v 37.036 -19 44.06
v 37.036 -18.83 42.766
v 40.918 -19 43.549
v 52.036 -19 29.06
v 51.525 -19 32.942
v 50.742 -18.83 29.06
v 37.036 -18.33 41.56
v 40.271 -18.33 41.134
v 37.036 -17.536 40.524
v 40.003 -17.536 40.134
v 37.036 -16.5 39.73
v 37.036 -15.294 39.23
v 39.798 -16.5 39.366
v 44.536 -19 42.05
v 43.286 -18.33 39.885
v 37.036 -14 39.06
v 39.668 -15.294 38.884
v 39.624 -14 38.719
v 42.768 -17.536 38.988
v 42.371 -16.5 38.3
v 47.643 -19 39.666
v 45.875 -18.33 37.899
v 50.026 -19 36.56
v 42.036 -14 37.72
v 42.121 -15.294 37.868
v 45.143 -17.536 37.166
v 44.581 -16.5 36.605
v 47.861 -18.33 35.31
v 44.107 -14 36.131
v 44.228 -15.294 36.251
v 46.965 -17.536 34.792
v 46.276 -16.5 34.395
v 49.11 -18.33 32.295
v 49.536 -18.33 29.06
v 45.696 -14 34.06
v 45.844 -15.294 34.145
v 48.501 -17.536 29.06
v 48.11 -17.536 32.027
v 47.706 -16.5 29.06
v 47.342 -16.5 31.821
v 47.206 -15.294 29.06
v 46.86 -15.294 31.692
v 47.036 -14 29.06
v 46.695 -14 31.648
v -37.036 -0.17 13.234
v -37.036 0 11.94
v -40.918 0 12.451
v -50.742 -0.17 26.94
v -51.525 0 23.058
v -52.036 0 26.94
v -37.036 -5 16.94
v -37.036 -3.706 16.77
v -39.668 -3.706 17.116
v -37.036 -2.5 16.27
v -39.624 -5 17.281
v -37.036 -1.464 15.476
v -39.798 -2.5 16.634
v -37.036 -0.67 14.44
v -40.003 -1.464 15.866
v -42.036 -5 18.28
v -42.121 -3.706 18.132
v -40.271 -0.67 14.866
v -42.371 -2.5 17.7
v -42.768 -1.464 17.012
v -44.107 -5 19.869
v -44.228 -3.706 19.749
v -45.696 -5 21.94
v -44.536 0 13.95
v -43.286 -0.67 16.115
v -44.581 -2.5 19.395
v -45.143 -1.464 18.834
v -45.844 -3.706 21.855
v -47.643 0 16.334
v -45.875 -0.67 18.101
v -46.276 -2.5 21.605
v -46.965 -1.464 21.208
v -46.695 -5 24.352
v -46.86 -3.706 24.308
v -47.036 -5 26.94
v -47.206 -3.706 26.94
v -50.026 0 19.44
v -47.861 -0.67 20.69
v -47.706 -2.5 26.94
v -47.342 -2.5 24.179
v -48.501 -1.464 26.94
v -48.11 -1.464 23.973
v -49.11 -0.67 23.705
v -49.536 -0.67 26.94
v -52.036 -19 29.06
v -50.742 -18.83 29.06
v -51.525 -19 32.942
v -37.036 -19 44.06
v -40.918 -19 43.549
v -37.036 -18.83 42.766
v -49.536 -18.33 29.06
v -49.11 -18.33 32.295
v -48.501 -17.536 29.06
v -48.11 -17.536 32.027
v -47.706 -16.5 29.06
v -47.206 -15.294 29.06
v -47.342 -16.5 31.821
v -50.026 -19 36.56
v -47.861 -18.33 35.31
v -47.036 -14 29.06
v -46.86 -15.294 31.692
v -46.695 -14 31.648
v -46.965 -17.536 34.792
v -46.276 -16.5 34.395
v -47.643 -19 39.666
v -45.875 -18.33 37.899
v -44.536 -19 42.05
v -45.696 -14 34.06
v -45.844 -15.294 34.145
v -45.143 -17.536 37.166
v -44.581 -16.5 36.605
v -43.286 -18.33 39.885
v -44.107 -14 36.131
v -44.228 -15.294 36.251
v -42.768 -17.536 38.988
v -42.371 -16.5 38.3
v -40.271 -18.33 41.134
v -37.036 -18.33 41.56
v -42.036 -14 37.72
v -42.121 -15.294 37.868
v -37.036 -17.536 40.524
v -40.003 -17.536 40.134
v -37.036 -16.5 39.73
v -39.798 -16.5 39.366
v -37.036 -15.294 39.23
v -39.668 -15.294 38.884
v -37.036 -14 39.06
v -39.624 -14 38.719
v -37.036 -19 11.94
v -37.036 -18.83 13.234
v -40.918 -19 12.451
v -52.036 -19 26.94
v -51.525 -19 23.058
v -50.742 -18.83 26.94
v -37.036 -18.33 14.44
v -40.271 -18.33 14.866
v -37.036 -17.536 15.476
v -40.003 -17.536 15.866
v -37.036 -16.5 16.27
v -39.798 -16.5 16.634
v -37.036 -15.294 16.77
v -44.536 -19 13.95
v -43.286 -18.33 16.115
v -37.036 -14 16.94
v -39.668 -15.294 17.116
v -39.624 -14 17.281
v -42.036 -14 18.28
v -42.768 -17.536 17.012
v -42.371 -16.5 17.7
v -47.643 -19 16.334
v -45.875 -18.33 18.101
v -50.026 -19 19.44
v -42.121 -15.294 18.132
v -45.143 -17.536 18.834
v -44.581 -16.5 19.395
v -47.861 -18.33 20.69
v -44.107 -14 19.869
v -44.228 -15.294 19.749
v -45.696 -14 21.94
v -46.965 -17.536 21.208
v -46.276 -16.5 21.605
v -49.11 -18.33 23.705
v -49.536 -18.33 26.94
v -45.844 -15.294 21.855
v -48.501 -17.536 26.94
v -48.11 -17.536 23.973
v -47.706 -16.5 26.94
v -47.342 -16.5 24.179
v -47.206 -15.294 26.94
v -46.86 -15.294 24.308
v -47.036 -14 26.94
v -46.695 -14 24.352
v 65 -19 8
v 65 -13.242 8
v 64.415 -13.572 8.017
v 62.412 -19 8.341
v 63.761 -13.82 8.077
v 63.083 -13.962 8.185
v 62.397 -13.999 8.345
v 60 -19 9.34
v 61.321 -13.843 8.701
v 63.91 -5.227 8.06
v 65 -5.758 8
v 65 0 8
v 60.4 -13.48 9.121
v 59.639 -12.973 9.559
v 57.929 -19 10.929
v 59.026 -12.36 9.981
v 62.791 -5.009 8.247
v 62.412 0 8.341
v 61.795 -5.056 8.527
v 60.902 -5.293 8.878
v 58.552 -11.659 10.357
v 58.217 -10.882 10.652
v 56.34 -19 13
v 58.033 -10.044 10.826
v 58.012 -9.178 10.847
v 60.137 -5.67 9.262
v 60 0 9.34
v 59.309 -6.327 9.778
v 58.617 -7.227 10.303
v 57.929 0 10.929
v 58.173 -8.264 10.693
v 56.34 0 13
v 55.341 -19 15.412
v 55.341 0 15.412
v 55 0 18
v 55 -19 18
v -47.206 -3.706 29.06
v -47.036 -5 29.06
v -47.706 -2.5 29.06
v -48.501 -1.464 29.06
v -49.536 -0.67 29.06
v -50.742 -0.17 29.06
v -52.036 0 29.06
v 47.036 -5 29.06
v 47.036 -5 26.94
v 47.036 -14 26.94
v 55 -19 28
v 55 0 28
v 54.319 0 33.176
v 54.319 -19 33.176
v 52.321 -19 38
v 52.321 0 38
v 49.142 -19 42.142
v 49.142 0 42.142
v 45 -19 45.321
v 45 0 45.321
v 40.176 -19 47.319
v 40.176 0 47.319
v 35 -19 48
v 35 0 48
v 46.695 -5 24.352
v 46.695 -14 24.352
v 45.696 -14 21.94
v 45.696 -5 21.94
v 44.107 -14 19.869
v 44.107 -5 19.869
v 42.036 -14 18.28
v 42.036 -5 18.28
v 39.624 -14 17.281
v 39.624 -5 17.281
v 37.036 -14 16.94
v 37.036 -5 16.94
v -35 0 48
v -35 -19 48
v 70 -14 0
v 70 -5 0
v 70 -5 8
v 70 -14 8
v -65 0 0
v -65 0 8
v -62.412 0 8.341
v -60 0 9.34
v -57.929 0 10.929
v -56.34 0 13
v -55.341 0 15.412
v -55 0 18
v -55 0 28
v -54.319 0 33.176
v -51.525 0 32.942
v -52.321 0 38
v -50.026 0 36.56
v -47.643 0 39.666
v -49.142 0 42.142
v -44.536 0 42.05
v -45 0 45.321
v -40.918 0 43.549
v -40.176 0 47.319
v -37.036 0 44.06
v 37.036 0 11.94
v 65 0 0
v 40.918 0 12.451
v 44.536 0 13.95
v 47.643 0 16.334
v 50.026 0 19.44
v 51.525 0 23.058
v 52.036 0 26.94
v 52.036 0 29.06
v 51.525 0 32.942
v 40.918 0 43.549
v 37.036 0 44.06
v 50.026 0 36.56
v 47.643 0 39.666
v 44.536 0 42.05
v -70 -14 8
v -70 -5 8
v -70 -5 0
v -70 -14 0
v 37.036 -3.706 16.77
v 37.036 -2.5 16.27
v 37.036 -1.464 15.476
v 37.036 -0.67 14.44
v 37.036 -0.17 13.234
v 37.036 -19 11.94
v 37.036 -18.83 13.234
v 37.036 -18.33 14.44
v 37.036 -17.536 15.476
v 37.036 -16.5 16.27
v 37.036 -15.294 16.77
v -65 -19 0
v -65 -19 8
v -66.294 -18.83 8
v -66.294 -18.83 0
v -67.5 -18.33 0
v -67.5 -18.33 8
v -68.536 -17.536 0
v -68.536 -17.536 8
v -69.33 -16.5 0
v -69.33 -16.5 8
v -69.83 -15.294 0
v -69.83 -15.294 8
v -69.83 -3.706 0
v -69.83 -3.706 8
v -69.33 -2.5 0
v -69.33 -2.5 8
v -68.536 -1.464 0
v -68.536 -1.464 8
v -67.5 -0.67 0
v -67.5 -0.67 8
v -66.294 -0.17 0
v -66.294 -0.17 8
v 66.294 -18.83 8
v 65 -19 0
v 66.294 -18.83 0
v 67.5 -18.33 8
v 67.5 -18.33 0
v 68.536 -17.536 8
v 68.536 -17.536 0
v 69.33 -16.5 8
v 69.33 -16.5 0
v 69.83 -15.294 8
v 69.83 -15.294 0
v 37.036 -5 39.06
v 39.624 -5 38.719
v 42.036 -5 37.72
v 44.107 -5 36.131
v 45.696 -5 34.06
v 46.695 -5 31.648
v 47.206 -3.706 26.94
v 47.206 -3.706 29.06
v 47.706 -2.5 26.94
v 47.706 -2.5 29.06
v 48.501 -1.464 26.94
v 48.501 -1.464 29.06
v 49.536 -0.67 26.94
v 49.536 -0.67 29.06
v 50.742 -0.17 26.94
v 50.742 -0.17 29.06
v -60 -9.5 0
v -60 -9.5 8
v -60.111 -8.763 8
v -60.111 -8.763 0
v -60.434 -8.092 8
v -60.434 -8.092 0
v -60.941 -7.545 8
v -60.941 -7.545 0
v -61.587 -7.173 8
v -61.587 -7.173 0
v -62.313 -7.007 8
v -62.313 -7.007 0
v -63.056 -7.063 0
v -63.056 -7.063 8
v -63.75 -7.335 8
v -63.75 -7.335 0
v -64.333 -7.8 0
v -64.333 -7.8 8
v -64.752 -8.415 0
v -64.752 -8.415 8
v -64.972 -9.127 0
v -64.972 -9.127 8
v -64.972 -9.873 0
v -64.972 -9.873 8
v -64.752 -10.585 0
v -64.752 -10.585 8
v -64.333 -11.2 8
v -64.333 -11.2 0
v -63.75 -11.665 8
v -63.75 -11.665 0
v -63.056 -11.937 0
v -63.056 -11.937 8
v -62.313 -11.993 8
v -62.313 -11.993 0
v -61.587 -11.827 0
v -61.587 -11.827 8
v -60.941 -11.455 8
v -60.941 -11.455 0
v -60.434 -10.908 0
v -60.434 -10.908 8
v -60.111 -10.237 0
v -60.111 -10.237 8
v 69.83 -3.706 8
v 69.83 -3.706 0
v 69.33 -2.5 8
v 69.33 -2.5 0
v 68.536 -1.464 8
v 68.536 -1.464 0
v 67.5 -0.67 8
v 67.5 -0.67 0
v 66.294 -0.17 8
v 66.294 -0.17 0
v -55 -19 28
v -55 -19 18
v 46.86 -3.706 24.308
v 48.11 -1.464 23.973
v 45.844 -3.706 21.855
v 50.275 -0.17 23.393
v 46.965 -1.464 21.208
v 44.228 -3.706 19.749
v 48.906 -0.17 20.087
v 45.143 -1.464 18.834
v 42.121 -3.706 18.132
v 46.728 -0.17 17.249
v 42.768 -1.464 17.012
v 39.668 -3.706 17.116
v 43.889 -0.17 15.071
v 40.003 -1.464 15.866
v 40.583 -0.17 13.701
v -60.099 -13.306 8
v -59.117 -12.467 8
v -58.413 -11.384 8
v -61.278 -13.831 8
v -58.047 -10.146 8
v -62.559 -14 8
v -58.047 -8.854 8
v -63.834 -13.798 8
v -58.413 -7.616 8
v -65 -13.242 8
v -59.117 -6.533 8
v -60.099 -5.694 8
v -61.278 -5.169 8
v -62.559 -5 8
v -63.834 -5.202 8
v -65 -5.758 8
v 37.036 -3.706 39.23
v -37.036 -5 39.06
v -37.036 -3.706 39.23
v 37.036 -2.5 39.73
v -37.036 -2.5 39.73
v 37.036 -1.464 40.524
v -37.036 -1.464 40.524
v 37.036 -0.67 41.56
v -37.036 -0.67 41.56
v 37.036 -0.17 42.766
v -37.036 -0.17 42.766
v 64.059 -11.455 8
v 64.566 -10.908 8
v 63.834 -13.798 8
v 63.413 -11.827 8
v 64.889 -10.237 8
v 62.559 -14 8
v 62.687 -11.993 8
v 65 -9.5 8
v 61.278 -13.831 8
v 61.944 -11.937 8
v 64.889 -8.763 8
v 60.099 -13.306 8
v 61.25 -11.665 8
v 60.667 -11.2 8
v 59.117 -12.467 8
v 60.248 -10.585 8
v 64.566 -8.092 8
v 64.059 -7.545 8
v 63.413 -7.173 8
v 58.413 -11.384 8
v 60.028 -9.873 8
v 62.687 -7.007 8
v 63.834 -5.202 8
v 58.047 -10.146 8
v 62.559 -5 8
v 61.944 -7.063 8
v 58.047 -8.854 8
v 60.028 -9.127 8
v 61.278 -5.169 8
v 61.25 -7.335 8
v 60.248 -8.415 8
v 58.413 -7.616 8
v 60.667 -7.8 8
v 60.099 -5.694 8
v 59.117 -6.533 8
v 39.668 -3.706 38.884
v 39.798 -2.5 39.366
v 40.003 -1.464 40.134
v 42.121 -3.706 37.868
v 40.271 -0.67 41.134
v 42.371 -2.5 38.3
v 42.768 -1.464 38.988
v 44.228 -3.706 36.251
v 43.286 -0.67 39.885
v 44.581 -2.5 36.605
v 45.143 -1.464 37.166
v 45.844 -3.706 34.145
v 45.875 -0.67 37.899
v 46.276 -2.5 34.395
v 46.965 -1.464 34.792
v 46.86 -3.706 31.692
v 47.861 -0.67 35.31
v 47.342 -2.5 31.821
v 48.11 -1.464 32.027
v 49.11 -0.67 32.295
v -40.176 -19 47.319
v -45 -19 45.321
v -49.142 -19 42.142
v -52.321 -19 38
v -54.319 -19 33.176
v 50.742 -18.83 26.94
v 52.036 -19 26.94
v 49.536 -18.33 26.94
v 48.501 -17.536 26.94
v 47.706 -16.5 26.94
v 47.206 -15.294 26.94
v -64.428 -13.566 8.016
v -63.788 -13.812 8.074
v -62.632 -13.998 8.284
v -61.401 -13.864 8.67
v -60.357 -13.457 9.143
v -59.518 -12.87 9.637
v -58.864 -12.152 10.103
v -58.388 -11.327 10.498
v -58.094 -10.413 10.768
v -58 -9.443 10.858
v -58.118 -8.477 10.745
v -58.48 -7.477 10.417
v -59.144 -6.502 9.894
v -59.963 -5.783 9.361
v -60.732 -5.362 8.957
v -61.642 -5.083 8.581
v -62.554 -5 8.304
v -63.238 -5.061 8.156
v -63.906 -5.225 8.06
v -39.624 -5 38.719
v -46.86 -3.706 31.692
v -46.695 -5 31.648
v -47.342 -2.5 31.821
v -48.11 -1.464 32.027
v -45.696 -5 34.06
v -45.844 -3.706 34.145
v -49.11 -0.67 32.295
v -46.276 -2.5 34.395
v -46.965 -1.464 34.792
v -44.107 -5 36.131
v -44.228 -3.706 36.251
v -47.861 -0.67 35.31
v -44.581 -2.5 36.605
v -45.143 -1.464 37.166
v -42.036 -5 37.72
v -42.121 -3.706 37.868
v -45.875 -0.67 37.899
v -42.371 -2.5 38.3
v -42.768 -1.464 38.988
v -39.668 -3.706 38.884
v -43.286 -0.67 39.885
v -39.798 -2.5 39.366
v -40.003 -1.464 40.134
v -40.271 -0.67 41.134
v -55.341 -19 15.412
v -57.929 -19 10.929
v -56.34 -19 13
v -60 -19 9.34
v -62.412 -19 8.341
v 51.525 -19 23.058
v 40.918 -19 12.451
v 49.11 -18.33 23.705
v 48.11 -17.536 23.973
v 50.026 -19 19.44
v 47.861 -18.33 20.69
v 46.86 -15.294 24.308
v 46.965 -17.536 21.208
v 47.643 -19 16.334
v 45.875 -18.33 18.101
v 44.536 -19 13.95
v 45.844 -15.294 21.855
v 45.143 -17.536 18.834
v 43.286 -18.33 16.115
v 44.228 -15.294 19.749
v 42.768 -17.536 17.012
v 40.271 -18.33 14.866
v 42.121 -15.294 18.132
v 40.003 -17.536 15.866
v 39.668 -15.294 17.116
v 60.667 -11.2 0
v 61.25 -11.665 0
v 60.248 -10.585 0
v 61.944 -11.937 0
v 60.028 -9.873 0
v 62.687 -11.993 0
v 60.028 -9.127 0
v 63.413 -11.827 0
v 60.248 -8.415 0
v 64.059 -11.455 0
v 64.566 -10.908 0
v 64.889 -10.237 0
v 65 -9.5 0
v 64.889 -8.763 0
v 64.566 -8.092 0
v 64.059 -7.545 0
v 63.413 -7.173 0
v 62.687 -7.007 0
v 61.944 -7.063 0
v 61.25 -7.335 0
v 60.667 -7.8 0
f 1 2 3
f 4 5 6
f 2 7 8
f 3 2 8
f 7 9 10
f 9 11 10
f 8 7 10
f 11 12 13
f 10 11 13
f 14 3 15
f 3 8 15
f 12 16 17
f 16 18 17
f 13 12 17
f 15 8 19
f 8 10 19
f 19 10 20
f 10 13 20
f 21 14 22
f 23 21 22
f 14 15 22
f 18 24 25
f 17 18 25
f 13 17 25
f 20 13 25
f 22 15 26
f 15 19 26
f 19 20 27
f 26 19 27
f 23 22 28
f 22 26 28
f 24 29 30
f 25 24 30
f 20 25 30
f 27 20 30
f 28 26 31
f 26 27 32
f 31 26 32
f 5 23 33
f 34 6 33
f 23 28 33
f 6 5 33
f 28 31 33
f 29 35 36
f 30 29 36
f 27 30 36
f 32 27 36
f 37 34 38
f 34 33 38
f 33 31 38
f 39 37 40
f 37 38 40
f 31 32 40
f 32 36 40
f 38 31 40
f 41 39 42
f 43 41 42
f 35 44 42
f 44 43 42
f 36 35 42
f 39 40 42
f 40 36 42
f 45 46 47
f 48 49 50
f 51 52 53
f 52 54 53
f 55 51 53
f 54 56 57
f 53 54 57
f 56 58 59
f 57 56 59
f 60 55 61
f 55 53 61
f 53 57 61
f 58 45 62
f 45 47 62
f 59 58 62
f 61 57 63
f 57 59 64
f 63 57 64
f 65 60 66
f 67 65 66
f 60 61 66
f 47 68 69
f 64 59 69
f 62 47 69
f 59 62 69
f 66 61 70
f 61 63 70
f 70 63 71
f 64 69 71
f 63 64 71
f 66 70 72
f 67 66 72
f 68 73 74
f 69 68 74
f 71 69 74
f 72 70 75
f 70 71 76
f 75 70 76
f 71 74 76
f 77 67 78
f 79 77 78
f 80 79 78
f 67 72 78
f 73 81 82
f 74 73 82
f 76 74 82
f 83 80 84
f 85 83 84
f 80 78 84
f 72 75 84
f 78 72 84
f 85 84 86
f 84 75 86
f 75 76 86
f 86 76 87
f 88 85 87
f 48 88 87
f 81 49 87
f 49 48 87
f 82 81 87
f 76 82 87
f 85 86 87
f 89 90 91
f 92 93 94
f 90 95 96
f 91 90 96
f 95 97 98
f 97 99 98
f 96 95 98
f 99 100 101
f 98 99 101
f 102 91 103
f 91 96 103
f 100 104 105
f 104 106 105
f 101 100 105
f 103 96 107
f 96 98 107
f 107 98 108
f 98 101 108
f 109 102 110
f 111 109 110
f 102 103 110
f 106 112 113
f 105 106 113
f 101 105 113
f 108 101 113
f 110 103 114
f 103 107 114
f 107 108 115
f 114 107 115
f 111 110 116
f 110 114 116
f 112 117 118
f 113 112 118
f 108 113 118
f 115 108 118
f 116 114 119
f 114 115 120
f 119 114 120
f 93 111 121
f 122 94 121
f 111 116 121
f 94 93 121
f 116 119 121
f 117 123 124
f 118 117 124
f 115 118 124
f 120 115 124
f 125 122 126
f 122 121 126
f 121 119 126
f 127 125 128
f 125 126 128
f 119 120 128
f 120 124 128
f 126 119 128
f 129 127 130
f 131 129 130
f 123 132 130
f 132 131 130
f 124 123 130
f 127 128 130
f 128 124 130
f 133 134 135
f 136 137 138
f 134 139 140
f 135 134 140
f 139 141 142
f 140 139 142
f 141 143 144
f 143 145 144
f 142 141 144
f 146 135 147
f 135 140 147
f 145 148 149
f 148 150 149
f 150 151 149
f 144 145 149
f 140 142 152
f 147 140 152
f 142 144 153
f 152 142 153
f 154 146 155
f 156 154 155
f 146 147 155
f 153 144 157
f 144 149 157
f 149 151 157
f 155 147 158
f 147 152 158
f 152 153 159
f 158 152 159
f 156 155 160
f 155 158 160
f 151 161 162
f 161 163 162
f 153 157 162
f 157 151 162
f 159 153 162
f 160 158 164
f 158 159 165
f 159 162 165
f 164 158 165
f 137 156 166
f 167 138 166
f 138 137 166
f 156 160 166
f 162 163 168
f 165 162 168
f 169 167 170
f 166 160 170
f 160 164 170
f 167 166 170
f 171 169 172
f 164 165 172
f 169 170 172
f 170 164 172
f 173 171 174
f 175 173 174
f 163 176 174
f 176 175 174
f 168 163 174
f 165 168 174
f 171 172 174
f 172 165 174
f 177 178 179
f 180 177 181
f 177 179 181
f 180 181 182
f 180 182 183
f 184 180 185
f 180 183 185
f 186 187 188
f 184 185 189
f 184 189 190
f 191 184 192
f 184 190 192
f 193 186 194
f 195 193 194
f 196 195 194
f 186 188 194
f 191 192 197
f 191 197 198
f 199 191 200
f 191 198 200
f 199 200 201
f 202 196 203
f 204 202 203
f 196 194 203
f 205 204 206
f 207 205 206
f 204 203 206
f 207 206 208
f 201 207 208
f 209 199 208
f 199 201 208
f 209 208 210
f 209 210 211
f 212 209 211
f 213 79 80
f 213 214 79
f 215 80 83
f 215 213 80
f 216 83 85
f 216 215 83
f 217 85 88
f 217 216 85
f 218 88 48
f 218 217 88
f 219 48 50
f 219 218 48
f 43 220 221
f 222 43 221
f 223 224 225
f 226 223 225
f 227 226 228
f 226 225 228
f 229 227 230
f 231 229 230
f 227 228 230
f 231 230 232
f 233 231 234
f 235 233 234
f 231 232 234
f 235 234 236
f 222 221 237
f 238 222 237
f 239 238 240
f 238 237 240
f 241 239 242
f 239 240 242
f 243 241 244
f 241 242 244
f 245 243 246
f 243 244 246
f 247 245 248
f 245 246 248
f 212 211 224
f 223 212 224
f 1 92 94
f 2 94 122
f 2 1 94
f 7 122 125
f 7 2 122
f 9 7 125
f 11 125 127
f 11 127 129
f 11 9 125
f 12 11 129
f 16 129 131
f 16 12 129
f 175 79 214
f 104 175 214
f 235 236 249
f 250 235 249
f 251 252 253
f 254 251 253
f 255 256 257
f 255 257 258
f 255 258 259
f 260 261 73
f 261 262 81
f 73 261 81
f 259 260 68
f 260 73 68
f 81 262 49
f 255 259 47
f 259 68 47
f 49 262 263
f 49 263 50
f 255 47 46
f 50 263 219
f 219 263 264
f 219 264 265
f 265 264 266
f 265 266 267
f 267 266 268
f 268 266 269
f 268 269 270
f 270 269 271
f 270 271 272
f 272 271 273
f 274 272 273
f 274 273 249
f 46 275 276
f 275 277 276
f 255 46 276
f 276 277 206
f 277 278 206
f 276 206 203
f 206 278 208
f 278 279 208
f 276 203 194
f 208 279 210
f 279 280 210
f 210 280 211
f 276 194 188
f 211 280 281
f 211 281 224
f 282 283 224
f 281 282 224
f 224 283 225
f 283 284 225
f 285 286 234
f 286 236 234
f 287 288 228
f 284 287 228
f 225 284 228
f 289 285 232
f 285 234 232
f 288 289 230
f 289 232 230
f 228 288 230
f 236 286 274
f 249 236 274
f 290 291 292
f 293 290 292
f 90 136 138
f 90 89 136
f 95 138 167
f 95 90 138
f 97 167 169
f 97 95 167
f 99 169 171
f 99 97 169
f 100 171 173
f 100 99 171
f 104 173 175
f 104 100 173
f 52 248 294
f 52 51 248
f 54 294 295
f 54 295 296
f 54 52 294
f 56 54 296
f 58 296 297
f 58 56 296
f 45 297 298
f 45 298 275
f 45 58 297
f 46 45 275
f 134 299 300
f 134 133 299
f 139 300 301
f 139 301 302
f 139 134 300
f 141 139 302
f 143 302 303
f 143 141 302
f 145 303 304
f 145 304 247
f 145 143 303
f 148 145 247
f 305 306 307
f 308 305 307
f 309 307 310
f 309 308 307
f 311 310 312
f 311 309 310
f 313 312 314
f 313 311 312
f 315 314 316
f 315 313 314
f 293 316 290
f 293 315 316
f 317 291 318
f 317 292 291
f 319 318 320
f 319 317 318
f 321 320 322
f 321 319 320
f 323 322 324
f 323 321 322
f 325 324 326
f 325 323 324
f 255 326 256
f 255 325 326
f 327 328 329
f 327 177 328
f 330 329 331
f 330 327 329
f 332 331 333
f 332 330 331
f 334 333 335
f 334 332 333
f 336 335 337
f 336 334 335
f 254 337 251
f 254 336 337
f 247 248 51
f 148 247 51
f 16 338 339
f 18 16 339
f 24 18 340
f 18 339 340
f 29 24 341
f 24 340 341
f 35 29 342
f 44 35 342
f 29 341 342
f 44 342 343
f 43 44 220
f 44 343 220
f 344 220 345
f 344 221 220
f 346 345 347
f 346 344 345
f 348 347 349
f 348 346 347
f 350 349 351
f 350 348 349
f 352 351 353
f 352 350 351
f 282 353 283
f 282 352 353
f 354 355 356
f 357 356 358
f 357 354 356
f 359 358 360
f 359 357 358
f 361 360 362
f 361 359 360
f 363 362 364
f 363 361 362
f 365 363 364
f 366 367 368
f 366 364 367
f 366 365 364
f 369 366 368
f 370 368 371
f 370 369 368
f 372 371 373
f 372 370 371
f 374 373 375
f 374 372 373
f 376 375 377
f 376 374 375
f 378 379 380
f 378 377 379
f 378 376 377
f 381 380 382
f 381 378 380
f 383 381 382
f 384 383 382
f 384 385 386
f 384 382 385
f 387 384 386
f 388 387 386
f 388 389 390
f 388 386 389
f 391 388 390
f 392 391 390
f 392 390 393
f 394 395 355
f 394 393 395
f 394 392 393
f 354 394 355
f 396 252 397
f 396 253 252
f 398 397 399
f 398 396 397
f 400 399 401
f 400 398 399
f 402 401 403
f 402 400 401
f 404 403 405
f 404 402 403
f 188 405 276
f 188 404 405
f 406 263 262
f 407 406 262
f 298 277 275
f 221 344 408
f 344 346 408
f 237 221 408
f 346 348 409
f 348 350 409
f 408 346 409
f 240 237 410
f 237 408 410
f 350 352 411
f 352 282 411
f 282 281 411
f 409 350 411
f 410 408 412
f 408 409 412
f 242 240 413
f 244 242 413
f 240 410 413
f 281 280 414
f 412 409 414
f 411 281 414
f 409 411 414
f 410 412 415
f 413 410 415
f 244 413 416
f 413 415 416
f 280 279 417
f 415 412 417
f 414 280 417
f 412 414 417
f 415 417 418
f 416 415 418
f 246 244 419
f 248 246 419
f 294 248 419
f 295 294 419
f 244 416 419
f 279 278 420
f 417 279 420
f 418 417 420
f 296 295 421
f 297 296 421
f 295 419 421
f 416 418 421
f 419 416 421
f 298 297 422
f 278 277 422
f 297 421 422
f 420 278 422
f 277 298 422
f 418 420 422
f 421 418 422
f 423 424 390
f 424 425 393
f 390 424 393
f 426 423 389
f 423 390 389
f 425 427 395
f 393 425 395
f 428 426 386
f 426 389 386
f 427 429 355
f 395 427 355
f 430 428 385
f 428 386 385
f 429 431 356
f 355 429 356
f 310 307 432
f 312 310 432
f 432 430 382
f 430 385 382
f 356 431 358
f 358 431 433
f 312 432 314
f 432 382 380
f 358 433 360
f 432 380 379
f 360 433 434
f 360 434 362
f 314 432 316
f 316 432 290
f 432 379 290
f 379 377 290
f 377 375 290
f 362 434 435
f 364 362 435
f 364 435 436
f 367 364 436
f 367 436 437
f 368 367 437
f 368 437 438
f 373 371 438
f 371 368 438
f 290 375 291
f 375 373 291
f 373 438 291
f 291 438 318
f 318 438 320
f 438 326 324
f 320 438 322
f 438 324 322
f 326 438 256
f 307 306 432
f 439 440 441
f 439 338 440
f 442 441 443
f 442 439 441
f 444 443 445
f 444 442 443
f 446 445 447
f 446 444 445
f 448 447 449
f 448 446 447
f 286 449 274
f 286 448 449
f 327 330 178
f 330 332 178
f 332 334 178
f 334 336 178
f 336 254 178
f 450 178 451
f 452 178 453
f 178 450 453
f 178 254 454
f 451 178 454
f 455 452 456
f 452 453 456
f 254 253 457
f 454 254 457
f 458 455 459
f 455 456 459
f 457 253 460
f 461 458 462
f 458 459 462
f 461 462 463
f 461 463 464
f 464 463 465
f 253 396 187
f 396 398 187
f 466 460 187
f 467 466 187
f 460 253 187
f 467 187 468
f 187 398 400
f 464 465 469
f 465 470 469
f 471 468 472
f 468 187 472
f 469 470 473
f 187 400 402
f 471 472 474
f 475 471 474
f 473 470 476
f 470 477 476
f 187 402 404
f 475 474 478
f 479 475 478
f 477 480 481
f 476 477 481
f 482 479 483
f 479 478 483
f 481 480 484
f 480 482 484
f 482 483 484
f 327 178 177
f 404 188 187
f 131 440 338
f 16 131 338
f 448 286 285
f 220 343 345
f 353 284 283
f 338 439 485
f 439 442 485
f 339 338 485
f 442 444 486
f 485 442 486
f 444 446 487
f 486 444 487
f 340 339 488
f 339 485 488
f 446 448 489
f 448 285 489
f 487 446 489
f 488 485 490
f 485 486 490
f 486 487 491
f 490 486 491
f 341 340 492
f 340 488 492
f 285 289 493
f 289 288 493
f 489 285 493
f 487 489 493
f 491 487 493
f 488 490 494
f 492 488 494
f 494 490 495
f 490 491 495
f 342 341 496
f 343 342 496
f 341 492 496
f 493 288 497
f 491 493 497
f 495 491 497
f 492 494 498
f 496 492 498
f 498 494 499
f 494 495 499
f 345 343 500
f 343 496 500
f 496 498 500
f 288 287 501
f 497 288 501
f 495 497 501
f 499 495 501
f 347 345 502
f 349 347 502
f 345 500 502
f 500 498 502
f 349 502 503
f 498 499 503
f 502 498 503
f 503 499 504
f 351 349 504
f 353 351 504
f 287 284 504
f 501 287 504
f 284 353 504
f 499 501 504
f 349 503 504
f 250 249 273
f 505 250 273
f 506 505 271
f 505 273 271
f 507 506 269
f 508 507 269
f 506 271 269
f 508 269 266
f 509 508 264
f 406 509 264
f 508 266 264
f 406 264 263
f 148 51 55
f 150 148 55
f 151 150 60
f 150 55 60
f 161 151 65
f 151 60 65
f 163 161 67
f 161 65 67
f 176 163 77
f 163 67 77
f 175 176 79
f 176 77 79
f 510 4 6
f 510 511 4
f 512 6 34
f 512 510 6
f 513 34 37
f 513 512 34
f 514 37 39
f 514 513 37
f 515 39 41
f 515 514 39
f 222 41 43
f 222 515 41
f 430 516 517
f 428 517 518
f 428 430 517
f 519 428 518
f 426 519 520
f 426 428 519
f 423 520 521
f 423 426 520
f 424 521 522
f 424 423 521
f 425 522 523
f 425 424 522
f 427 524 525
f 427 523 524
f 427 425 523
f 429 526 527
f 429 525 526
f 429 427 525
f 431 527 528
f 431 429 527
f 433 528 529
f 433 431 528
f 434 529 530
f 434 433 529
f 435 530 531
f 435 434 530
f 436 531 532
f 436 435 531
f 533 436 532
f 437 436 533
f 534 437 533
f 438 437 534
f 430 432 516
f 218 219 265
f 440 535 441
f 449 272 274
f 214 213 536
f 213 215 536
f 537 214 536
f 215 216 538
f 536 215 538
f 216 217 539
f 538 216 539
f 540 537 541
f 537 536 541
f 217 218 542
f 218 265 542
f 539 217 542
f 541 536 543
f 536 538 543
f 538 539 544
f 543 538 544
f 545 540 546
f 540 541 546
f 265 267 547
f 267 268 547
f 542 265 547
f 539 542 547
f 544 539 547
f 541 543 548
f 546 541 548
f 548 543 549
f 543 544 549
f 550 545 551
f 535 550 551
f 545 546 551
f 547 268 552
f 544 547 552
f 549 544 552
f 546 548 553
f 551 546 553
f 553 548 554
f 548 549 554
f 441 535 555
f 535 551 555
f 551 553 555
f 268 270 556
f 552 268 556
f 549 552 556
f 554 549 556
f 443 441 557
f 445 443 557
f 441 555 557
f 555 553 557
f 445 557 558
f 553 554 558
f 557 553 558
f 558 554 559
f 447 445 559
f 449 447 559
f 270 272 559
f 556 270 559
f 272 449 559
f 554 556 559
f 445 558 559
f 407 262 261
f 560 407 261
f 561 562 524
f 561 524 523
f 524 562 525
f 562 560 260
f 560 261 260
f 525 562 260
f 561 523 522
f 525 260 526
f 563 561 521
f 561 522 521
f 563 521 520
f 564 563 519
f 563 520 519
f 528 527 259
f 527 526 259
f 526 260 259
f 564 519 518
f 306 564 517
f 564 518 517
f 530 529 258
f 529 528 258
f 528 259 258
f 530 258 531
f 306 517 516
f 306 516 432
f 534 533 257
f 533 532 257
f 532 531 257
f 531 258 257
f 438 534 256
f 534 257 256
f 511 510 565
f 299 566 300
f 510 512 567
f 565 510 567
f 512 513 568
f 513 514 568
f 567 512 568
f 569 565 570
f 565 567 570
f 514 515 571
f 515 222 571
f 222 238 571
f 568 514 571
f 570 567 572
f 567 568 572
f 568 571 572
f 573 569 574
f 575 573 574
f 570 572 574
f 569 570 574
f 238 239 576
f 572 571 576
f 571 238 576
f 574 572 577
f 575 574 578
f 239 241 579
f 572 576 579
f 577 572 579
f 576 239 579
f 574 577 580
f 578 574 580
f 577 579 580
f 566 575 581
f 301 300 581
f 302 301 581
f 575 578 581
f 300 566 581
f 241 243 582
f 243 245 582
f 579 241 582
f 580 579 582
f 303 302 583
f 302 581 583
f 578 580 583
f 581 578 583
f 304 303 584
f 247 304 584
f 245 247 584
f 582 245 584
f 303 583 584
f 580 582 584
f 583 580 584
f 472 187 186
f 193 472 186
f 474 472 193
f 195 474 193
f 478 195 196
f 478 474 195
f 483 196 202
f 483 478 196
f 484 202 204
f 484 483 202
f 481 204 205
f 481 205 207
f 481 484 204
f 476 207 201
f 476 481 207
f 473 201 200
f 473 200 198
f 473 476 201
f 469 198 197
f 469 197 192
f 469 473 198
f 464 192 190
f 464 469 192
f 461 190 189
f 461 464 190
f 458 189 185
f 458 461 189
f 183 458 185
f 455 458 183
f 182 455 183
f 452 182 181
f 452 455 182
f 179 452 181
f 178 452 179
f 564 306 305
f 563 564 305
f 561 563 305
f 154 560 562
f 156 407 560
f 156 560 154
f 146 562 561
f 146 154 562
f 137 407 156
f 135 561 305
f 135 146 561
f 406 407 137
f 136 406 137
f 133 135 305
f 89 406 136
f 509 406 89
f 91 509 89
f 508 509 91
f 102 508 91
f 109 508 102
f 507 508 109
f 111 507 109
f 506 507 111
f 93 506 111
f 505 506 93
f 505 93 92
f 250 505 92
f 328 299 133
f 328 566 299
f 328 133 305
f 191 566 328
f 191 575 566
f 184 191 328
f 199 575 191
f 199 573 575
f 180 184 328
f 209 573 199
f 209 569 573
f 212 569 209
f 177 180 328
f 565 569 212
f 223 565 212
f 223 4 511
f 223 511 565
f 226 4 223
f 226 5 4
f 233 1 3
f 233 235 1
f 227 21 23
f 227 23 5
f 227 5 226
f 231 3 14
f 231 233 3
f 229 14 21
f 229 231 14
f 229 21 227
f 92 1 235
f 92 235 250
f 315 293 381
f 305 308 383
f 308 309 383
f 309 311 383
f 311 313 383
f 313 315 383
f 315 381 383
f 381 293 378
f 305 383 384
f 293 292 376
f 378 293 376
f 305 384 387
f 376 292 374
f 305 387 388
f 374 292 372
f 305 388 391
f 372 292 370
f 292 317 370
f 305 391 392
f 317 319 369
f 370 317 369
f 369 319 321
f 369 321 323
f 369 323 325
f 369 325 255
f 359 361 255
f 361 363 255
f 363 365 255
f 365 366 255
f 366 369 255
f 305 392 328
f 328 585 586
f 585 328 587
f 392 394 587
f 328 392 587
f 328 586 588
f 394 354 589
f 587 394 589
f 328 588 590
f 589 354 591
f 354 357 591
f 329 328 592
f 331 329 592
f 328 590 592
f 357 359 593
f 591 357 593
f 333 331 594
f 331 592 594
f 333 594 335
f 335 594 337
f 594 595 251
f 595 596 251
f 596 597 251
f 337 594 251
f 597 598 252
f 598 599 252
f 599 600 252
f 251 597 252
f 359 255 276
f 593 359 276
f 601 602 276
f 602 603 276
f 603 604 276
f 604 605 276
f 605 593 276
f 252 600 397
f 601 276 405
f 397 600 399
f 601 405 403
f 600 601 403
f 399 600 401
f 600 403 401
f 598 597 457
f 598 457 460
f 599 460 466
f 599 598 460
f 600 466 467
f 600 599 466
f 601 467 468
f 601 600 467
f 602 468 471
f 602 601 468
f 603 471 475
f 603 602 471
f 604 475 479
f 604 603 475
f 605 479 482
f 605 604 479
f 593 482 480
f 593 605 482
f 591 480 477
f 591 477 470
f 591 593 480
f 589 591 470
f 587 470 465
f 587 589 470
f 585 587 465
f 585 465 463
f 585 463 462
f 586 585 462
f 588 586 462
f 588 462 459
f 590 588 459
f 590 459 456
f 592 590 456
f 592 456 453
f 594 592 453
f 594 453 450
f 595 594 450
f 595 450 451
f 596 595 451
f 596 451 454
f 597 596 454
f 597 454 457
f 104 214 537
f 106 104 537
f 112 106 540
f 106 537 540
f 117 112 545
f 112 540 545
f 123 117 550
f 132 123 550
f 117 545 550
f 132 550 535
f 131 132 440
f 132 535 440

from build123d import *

# Parameters (mm, degrees)
F1_DEPTH = 19
F2_R     = 2.5
F3_DEPTH = 48.001
F4_START = 8
F2_R_2   = 4.5
F4_DEPTH = 40.001
F5_R     = 5
F6_R     = 5


with BuildPart() as f1:
    # F0 (on Front) → F1 (new body)
    with BuildSketch(Plane.XZ):
        with BuildLine():
            Line((-70, 8), (-70, 0))
            Line((-70, 0), (70, 0))
            Line((70, 0), (70, 8))
            Line((70, 8), (65, 8))
            ThreePointArc((65, 8), (57.9289321881, 10.9289321881), (55, 18))
            Line((55, 18), (55, 28))
            ThreePointArc((55, 28), (49.1421356237, 42.1421356237), (35, 48))
            Line((35, 48), (-35, 48))
            ThreePointArc((-35, 48), (-49.1421356237, 42.1421356237), (-55, 28))
            Line((-55, 28), (-55, 18))
            ThreePointArc((-55, 18), (-57.9289321881, 10.9289321881), (-65, 8))
            Line((-65, 8), (-70, 8))
        make_face()
        with BuildLine():
            ThreePointArc((47.0360852778, 26.9401988387), (44.1071530897, 19.8691310268), (37.0360852778, 16.9401988387))
            Line((37.0360852778, 16.9401988387), (-37.0360852778, 16.9401988387))
            ThreePointArc((-37.0360852778, 16.9401988387), (-44.1071530897, 19.8691310268), (-47.0360852778, 26.9401988387))
            Line((-47.0360852778, 26.9401988387), (-47.0360852778, 29.0598011613))
            ThreePointArc((-47.0360852778, 29.0598011613), (-44.1071530897, 36.1308689732), (-37.0360852778, 39.0598011613))
            Line((-37.0360852778, 39.0598011613), (37.0360852778, 39.0598011613))
            ThreePointArc((37.0360852778, 39.0598011613), (44.1071530897, 36.1308689732), (47.0360852778, 29.0598011613))
            Line((47.0360852778, 29.0598011613), (47.0360852778, 26.9401988387))
        make_face(mode=Mode.SUBTRACT)
    extrude(amount=F1_DEPTH)

    # F2 (on Top) → F3 (cut, through all)
    with BuildSketch(Plane.XY):
        with Locations((-62.5, -9.5)):
            Circle(F2_R)
        with Locations((62.5, -9.5)):
            Circle(F2_R)
    extrude(amount=F3_DEPTH, mode=Mode.SUBTRACT)

    # F2 (on Top) → F4 (cut)
    with BuildSketch(Plane.XY.offset(F4_START)):
        with Locations((-62.5, -9.5)):
            Circle(F2_R_2)
        with Locations((-62.5, -9.5)):
            Circle(F2_R, mode=Mode.SUBTRACT)
        with Locations((62.5, -9.5)):
            Circle(F2_R_2)
        with Locations((62.5, -9.5)):
            Circle(F2_R, mode=Mode.SUBTRACT)
    extrude(amount=F4_DEPTH, mode=Mode.SUBTRACT)

    # F5
    f5_edges = [f1.edges().sort_by_distance(p)[0] for p in [
        (0, -19, 16.940199),
        (0, 0, 16.940199),
    ]]
    fillet(f5_edges, radius=F5_R)

    # F6
    f6_edges = [f1.edges().sort_by_distance(p)[0] for p in [
        (70, -19, 4),
        (70, 0, 4),
        (-70, -19, 4),
        (-70, 0, 4),
    ]]
    fillet(f6_edges, radius=F6_R)


solid = f1.part
